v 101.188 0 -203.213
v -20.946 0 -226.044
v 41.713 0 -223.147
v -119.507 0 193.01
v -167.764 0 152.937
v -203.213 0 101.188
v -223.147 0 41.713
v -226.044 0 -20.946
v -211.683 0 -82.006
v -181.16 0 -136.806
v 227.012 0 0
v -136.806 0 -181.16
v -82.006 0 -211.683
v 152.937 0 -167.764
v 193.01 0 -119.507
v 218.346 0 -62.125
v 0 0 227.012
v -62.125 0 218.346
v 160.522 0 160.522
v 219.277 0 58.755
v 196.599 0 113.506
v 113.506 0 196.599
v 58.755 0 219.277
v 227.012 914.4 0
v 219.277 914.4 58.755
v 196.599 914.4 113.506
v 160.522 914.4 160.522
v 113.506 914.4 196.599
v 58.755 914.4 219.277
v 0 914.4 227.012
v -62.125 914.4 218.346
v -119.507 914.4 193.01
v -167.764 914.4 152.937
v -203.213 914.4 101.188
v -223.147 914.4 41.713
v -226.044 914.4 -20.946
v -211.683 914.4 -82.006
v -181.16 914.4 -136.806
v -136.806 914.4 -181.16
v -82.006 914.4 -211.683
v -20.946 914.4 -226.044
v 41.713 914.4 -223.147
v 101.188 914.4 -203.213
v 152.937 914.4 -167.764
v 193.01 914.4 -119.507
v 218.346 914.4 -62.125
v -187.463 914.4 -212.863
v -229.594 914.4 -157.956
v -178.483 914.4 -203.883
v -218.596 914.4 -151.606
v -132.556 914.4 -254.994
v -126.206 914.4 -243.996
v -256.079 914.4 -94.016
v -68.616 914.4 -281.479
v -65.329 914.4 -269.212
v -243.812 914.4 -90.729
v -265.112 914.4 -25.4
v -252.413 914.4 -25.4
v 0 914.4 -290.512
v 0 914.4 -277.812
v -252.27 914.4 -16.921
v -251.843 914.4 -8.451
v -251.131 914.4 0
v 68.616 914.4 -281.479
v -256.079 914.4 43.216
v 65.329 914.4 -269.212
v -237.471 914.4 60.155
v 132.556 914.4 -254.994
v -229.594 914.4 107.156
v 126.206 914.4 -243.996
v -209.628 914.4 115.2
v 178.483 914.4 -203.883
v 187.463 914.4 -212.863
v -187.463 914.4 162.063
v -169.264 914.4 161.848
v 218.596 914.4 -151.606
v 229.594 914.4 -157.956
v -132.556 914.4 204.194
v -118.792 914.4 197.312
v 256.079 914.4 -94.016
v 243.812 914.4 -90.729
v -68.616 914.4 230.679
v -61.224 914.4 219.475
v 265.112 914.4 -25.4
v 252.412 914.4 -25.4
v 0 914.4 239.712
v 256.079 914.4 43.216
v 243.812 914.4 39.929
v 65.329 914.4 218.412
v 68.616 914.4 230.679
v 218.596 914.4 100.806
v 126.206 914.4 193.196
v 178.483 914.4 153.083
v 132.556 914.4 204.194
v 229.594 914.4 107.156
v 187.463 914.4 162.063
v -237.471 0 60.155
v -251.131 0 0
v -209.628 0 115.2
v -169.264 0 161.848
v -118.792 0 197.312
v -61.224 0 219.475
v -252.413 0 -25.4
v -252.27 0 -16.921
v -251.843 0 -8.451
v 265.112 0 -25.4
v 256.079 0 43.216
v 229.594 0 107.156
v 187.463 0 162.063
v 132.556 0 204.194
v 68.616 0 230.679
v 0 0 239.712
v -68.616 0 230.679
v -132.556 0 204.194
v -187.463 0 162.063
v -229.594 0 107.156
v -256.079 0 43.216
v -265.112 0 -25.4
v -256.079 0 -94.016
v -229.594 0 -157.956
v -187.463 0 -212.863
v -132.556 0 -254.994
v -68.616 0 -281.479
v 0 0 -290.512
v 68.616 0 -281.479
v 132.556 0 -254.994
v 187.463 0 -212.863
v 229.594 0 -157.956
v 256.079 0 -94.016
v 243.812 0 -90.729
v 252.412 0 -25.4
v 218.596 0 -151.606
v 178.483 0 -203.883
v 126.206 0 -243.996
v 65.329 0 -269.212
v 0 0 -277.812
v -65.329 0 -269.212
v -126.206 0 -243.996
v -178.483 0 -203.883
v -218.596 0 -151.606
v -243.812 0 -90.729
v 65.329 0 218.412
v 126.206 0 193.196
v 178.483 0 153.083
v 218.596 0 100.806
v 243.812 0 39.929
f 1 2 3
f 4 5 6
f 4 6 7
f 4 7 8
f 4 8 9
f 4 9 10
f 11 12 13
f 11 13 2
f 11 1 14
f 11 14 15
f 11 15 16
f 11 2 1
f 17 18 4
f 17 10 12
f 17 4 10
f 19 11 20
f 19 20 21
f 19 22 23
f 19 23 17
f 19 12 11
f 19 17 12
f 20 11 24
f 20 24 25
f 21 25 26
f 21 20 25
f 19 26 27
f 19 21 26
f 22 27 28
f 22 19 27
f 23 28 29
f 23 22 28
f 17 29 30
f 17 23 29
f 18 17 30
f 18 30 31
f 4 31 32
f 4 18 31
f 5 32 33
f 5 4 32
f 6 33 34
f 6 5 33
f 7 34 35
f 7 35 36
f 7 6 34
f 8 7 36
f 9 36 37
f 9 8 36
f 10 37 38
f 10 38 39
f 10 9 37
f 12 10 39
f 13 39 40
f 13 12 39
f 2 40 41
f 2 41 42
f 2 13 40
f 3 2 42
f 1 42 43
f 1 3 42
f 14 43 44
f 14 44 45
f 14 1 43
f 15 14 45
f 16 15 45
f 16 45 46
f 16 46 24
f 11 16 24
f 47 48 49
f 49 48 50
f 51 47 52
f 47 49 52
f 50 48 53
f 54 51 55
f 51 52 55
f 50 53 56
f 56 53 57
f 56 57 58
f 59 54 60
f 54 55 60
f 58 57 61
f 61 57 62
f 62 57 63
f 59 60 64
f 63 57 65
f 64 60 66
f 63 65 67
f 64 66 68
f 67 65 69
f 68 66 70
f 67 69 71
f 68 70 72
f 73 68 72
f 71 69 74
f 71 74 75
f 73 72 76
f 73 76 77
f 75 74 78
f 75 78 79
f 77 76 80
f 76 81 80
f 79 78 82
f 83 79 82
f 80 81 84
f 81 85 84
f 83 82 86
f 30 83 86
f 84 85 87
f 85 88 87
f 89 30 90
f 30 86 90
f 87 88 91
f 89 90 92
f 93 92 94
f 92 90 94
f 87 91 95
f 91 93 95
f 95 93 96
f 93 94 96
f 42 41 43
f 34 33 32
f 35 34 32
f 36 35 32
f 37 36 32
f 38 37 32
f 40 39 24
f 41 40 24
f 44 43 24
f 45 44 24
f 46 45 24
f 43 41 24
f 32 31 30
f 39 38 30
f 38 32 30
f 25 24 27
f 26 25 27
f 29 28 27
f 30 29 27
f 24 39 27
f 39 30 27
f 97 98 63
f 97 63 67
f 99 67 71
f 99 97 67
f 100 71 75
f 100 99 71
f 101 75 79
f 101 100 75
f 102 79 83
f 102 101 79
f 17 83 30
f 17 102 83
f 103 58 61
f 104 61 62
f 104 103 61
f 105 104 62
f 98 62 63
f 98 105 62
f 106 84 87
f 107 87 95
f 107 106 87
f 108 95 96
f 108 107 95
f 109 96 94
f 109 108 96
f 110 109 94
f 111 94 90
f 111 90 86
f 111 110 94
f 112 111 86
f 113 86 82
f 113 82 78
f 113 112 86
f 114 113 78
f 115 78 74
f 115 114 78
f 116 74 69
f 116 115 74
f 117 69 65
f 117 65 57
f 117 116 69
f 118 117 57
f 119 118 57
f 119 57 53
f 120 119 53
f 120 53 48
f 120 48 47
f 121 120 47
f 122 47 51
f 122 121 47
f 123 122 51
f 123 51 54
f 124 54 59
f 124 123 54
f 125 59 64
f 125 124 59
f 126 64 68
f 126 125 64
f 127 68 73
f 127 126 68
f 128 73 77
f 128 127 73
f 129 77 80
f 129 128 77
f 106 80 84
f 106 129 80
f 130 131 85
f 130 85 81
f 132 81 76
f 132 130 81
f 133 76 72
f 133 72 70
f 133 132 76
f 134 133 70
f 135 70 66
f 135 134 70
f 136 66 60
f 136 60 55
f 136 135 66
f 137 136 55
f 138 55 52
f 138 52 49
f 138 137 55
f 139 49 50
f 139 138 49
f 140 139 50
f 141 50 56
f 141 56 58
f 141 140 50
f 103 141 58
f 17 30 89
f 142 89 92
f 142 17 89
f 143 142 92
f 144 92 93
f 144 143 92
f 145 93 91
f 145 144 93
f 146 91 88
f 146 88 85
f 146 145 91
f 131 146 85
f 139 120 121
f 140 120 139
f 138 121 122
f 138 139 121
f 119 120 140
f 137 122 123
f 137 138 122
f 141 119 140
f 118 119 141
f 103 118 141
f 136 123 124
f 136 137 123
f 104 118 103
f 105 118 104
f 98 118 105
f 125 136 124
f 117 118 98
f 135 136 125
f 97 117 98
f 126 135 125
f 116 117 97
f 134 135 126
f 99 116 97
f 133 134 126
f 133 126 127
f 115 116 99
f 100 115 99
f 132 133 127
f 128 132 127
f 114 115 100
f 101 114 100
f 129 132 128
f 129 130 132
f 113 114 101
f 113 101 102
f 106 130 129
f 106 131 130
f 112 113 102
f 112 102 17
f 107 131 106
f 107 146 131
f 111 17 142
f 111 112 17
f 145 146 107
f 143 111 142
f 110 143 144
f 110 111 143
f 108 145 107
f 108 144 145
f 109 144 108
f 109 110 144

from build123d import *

# Parameters (mm, degrees)
F0_R     = 227.0125
F1_DEPTH = 914.4
F2_R     = 265.1125
F3_DEPTH = 914.4


with BuildPart() as f1:
    # F0 (on Front) → F1 (new body)
    with BuildSketch(Plane.XZ):
        Circle(F0_R)
    extrude(amount=-F1_DEPTH)

    # F2 (on face) → F3 (join)
    with BuildSketch(Plane.XZ):
        with Locations((0, -25.4)):
            Circle(F2_R)
        with BuildLine():
            ThreePointArc((0, 227.0125), (178.48259, 153.08259), (252.4125, -25.4))
            ThreePointArc((252.4125, -25.4), (0, -277.8125), (-252.4125, -25.4))
            ThreePointArc((-252.4125, -25.4), (-252.091987, -12.683853), (-251.131261, 0))
            ThreePointArc((-251.131261, 0), (-169.26428, 161.847627), (0, 227.0125))
        make_face(mode=Mode.SUBTRACT)
    extrude(amount=-F3_DEPTH)


solid = f1.part
